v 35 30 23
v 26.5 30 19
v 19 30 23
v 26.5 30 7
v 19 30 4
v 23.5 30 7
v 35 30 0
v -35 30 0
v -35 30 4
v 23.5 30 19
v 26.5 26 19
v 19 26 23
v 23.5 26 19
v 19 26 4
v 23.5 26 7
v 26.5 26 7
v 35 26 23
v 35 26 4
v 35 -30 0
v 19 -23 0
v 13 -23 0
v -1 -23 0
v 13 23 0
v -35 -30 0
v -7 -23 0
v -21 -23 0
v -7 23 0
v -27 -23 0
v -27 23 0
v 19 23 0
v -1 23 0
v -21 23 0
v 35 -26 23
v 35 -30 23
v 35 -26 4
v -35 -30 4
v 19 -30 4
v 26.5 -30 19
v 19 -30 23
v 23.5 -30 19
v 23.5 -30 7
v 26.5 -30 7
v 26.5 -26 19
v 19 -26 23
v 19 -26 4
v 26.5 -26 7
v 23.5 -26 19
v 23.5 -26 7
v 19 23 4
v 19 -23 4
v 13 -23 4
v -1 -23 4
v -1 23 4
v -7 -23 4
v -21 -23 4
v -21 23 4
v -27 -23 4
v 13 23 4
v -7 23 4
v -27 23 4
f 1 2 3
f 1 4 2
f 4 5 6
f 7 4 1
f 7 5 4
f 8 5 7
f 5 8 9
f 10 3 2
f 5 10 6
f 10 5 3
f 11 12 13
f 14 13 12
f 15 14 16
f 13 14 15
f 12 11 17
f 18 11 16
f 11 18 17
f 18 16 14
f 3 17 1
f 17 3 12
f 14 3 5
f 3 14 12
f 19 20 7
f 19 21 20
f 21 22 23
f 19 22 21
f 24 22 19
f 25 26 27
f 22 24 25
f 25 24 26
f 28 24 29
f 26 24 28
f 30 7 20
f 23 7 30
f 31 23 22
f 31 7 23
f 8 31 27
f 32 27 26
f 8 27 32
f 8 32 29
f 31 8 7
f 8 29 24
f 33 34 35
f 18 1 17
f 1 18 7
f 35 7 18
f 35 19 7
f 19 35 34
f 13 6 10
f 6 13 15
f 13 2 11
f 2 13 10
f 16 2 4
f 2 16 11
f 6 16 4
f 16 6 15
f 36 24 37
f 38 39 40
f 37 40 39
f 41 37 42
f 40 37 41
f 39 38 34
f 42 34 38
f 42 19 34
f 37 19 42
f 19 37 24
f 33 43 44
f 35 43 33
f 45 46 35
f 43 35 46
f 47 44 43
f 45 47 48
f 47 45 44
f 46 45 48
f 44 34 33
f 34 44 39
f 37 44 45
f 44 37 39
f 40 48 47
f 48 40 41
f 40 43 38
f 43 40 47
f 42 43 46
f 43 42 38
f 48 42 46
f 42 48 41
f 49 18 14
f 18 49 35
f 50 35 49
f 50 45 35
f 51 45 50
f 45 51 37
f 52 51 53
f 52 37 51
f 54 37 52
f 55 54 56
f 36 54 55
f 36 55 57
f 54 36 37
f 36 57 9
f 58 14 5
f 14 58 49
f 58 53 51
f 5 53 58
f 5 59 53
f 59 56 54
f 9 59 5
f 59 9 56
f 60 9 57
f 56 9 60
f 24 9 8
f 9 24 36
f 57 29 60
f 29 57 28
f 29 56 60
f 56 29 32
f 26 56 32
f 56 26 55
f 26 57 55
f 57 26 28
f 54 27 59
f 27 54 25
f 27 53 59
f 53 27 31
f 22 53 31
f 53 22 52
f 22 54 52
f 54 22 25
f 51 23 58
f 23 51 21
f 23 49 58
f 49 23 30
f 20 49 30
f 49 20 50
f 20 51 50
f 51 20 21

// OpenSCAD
// Suporte Redução SDL
//
// (c) 2014 Afonso Coutinho <afonso@yack.com.br>
// (c) 2014 Felipe Sanches <juca@members.fsf.org>
//
// This program is free software: you can redistribute it and/or modify
// it under the terms of the GNU General Public License as published by
// the Free Software Foundation, either version 2 of the License, or
// (at your option) any later version.
//
// This program is distributed in the hope that it will be useful,
// but WITHOUT ANY WARRANTY; without even the implied warranty of
// MERCHANTABILITY or FITNESS FOR A PARTICULAR PURPOSE.  See the
// GNU General Public License for more details.
//
// You should have received a copy of the GNU General Public License
// along with this program.  If not, see <http://www.gnu.org/licenses/>.

module bottom_plate(){
	linear_extrude(height = 4)
	difference(){
		square([70,60], center = true);

		for (i=[0:2])
			translate([-24 + 20*i, 0])
			square([6,46], center = true);
	}
}

module lateral(){
//lateral com janela
	rotate([90,0])
	linear_extrude(height=4)
	difference(){
		square([16,23]);

		translate([4.5,7])
		square([3,12]);
	}

//triangulo de trás
	translate([16,0])
	rotate([0,-90])
	linear_extrude(height=4)
	mirror([0,1])
	hull(){
		square([23,4]);
		square([4,20]);
	}
}

module simetria_em_Y(){
	child(0);

	mirror([0,1])
	child(0);
}

module Suporte_Reducao_SDL(){
	bottom_plate();

	simetria_em_Y(){
		translate([19,30])
		lateral();
	}
}

Suporte_Reducao_SDL();
